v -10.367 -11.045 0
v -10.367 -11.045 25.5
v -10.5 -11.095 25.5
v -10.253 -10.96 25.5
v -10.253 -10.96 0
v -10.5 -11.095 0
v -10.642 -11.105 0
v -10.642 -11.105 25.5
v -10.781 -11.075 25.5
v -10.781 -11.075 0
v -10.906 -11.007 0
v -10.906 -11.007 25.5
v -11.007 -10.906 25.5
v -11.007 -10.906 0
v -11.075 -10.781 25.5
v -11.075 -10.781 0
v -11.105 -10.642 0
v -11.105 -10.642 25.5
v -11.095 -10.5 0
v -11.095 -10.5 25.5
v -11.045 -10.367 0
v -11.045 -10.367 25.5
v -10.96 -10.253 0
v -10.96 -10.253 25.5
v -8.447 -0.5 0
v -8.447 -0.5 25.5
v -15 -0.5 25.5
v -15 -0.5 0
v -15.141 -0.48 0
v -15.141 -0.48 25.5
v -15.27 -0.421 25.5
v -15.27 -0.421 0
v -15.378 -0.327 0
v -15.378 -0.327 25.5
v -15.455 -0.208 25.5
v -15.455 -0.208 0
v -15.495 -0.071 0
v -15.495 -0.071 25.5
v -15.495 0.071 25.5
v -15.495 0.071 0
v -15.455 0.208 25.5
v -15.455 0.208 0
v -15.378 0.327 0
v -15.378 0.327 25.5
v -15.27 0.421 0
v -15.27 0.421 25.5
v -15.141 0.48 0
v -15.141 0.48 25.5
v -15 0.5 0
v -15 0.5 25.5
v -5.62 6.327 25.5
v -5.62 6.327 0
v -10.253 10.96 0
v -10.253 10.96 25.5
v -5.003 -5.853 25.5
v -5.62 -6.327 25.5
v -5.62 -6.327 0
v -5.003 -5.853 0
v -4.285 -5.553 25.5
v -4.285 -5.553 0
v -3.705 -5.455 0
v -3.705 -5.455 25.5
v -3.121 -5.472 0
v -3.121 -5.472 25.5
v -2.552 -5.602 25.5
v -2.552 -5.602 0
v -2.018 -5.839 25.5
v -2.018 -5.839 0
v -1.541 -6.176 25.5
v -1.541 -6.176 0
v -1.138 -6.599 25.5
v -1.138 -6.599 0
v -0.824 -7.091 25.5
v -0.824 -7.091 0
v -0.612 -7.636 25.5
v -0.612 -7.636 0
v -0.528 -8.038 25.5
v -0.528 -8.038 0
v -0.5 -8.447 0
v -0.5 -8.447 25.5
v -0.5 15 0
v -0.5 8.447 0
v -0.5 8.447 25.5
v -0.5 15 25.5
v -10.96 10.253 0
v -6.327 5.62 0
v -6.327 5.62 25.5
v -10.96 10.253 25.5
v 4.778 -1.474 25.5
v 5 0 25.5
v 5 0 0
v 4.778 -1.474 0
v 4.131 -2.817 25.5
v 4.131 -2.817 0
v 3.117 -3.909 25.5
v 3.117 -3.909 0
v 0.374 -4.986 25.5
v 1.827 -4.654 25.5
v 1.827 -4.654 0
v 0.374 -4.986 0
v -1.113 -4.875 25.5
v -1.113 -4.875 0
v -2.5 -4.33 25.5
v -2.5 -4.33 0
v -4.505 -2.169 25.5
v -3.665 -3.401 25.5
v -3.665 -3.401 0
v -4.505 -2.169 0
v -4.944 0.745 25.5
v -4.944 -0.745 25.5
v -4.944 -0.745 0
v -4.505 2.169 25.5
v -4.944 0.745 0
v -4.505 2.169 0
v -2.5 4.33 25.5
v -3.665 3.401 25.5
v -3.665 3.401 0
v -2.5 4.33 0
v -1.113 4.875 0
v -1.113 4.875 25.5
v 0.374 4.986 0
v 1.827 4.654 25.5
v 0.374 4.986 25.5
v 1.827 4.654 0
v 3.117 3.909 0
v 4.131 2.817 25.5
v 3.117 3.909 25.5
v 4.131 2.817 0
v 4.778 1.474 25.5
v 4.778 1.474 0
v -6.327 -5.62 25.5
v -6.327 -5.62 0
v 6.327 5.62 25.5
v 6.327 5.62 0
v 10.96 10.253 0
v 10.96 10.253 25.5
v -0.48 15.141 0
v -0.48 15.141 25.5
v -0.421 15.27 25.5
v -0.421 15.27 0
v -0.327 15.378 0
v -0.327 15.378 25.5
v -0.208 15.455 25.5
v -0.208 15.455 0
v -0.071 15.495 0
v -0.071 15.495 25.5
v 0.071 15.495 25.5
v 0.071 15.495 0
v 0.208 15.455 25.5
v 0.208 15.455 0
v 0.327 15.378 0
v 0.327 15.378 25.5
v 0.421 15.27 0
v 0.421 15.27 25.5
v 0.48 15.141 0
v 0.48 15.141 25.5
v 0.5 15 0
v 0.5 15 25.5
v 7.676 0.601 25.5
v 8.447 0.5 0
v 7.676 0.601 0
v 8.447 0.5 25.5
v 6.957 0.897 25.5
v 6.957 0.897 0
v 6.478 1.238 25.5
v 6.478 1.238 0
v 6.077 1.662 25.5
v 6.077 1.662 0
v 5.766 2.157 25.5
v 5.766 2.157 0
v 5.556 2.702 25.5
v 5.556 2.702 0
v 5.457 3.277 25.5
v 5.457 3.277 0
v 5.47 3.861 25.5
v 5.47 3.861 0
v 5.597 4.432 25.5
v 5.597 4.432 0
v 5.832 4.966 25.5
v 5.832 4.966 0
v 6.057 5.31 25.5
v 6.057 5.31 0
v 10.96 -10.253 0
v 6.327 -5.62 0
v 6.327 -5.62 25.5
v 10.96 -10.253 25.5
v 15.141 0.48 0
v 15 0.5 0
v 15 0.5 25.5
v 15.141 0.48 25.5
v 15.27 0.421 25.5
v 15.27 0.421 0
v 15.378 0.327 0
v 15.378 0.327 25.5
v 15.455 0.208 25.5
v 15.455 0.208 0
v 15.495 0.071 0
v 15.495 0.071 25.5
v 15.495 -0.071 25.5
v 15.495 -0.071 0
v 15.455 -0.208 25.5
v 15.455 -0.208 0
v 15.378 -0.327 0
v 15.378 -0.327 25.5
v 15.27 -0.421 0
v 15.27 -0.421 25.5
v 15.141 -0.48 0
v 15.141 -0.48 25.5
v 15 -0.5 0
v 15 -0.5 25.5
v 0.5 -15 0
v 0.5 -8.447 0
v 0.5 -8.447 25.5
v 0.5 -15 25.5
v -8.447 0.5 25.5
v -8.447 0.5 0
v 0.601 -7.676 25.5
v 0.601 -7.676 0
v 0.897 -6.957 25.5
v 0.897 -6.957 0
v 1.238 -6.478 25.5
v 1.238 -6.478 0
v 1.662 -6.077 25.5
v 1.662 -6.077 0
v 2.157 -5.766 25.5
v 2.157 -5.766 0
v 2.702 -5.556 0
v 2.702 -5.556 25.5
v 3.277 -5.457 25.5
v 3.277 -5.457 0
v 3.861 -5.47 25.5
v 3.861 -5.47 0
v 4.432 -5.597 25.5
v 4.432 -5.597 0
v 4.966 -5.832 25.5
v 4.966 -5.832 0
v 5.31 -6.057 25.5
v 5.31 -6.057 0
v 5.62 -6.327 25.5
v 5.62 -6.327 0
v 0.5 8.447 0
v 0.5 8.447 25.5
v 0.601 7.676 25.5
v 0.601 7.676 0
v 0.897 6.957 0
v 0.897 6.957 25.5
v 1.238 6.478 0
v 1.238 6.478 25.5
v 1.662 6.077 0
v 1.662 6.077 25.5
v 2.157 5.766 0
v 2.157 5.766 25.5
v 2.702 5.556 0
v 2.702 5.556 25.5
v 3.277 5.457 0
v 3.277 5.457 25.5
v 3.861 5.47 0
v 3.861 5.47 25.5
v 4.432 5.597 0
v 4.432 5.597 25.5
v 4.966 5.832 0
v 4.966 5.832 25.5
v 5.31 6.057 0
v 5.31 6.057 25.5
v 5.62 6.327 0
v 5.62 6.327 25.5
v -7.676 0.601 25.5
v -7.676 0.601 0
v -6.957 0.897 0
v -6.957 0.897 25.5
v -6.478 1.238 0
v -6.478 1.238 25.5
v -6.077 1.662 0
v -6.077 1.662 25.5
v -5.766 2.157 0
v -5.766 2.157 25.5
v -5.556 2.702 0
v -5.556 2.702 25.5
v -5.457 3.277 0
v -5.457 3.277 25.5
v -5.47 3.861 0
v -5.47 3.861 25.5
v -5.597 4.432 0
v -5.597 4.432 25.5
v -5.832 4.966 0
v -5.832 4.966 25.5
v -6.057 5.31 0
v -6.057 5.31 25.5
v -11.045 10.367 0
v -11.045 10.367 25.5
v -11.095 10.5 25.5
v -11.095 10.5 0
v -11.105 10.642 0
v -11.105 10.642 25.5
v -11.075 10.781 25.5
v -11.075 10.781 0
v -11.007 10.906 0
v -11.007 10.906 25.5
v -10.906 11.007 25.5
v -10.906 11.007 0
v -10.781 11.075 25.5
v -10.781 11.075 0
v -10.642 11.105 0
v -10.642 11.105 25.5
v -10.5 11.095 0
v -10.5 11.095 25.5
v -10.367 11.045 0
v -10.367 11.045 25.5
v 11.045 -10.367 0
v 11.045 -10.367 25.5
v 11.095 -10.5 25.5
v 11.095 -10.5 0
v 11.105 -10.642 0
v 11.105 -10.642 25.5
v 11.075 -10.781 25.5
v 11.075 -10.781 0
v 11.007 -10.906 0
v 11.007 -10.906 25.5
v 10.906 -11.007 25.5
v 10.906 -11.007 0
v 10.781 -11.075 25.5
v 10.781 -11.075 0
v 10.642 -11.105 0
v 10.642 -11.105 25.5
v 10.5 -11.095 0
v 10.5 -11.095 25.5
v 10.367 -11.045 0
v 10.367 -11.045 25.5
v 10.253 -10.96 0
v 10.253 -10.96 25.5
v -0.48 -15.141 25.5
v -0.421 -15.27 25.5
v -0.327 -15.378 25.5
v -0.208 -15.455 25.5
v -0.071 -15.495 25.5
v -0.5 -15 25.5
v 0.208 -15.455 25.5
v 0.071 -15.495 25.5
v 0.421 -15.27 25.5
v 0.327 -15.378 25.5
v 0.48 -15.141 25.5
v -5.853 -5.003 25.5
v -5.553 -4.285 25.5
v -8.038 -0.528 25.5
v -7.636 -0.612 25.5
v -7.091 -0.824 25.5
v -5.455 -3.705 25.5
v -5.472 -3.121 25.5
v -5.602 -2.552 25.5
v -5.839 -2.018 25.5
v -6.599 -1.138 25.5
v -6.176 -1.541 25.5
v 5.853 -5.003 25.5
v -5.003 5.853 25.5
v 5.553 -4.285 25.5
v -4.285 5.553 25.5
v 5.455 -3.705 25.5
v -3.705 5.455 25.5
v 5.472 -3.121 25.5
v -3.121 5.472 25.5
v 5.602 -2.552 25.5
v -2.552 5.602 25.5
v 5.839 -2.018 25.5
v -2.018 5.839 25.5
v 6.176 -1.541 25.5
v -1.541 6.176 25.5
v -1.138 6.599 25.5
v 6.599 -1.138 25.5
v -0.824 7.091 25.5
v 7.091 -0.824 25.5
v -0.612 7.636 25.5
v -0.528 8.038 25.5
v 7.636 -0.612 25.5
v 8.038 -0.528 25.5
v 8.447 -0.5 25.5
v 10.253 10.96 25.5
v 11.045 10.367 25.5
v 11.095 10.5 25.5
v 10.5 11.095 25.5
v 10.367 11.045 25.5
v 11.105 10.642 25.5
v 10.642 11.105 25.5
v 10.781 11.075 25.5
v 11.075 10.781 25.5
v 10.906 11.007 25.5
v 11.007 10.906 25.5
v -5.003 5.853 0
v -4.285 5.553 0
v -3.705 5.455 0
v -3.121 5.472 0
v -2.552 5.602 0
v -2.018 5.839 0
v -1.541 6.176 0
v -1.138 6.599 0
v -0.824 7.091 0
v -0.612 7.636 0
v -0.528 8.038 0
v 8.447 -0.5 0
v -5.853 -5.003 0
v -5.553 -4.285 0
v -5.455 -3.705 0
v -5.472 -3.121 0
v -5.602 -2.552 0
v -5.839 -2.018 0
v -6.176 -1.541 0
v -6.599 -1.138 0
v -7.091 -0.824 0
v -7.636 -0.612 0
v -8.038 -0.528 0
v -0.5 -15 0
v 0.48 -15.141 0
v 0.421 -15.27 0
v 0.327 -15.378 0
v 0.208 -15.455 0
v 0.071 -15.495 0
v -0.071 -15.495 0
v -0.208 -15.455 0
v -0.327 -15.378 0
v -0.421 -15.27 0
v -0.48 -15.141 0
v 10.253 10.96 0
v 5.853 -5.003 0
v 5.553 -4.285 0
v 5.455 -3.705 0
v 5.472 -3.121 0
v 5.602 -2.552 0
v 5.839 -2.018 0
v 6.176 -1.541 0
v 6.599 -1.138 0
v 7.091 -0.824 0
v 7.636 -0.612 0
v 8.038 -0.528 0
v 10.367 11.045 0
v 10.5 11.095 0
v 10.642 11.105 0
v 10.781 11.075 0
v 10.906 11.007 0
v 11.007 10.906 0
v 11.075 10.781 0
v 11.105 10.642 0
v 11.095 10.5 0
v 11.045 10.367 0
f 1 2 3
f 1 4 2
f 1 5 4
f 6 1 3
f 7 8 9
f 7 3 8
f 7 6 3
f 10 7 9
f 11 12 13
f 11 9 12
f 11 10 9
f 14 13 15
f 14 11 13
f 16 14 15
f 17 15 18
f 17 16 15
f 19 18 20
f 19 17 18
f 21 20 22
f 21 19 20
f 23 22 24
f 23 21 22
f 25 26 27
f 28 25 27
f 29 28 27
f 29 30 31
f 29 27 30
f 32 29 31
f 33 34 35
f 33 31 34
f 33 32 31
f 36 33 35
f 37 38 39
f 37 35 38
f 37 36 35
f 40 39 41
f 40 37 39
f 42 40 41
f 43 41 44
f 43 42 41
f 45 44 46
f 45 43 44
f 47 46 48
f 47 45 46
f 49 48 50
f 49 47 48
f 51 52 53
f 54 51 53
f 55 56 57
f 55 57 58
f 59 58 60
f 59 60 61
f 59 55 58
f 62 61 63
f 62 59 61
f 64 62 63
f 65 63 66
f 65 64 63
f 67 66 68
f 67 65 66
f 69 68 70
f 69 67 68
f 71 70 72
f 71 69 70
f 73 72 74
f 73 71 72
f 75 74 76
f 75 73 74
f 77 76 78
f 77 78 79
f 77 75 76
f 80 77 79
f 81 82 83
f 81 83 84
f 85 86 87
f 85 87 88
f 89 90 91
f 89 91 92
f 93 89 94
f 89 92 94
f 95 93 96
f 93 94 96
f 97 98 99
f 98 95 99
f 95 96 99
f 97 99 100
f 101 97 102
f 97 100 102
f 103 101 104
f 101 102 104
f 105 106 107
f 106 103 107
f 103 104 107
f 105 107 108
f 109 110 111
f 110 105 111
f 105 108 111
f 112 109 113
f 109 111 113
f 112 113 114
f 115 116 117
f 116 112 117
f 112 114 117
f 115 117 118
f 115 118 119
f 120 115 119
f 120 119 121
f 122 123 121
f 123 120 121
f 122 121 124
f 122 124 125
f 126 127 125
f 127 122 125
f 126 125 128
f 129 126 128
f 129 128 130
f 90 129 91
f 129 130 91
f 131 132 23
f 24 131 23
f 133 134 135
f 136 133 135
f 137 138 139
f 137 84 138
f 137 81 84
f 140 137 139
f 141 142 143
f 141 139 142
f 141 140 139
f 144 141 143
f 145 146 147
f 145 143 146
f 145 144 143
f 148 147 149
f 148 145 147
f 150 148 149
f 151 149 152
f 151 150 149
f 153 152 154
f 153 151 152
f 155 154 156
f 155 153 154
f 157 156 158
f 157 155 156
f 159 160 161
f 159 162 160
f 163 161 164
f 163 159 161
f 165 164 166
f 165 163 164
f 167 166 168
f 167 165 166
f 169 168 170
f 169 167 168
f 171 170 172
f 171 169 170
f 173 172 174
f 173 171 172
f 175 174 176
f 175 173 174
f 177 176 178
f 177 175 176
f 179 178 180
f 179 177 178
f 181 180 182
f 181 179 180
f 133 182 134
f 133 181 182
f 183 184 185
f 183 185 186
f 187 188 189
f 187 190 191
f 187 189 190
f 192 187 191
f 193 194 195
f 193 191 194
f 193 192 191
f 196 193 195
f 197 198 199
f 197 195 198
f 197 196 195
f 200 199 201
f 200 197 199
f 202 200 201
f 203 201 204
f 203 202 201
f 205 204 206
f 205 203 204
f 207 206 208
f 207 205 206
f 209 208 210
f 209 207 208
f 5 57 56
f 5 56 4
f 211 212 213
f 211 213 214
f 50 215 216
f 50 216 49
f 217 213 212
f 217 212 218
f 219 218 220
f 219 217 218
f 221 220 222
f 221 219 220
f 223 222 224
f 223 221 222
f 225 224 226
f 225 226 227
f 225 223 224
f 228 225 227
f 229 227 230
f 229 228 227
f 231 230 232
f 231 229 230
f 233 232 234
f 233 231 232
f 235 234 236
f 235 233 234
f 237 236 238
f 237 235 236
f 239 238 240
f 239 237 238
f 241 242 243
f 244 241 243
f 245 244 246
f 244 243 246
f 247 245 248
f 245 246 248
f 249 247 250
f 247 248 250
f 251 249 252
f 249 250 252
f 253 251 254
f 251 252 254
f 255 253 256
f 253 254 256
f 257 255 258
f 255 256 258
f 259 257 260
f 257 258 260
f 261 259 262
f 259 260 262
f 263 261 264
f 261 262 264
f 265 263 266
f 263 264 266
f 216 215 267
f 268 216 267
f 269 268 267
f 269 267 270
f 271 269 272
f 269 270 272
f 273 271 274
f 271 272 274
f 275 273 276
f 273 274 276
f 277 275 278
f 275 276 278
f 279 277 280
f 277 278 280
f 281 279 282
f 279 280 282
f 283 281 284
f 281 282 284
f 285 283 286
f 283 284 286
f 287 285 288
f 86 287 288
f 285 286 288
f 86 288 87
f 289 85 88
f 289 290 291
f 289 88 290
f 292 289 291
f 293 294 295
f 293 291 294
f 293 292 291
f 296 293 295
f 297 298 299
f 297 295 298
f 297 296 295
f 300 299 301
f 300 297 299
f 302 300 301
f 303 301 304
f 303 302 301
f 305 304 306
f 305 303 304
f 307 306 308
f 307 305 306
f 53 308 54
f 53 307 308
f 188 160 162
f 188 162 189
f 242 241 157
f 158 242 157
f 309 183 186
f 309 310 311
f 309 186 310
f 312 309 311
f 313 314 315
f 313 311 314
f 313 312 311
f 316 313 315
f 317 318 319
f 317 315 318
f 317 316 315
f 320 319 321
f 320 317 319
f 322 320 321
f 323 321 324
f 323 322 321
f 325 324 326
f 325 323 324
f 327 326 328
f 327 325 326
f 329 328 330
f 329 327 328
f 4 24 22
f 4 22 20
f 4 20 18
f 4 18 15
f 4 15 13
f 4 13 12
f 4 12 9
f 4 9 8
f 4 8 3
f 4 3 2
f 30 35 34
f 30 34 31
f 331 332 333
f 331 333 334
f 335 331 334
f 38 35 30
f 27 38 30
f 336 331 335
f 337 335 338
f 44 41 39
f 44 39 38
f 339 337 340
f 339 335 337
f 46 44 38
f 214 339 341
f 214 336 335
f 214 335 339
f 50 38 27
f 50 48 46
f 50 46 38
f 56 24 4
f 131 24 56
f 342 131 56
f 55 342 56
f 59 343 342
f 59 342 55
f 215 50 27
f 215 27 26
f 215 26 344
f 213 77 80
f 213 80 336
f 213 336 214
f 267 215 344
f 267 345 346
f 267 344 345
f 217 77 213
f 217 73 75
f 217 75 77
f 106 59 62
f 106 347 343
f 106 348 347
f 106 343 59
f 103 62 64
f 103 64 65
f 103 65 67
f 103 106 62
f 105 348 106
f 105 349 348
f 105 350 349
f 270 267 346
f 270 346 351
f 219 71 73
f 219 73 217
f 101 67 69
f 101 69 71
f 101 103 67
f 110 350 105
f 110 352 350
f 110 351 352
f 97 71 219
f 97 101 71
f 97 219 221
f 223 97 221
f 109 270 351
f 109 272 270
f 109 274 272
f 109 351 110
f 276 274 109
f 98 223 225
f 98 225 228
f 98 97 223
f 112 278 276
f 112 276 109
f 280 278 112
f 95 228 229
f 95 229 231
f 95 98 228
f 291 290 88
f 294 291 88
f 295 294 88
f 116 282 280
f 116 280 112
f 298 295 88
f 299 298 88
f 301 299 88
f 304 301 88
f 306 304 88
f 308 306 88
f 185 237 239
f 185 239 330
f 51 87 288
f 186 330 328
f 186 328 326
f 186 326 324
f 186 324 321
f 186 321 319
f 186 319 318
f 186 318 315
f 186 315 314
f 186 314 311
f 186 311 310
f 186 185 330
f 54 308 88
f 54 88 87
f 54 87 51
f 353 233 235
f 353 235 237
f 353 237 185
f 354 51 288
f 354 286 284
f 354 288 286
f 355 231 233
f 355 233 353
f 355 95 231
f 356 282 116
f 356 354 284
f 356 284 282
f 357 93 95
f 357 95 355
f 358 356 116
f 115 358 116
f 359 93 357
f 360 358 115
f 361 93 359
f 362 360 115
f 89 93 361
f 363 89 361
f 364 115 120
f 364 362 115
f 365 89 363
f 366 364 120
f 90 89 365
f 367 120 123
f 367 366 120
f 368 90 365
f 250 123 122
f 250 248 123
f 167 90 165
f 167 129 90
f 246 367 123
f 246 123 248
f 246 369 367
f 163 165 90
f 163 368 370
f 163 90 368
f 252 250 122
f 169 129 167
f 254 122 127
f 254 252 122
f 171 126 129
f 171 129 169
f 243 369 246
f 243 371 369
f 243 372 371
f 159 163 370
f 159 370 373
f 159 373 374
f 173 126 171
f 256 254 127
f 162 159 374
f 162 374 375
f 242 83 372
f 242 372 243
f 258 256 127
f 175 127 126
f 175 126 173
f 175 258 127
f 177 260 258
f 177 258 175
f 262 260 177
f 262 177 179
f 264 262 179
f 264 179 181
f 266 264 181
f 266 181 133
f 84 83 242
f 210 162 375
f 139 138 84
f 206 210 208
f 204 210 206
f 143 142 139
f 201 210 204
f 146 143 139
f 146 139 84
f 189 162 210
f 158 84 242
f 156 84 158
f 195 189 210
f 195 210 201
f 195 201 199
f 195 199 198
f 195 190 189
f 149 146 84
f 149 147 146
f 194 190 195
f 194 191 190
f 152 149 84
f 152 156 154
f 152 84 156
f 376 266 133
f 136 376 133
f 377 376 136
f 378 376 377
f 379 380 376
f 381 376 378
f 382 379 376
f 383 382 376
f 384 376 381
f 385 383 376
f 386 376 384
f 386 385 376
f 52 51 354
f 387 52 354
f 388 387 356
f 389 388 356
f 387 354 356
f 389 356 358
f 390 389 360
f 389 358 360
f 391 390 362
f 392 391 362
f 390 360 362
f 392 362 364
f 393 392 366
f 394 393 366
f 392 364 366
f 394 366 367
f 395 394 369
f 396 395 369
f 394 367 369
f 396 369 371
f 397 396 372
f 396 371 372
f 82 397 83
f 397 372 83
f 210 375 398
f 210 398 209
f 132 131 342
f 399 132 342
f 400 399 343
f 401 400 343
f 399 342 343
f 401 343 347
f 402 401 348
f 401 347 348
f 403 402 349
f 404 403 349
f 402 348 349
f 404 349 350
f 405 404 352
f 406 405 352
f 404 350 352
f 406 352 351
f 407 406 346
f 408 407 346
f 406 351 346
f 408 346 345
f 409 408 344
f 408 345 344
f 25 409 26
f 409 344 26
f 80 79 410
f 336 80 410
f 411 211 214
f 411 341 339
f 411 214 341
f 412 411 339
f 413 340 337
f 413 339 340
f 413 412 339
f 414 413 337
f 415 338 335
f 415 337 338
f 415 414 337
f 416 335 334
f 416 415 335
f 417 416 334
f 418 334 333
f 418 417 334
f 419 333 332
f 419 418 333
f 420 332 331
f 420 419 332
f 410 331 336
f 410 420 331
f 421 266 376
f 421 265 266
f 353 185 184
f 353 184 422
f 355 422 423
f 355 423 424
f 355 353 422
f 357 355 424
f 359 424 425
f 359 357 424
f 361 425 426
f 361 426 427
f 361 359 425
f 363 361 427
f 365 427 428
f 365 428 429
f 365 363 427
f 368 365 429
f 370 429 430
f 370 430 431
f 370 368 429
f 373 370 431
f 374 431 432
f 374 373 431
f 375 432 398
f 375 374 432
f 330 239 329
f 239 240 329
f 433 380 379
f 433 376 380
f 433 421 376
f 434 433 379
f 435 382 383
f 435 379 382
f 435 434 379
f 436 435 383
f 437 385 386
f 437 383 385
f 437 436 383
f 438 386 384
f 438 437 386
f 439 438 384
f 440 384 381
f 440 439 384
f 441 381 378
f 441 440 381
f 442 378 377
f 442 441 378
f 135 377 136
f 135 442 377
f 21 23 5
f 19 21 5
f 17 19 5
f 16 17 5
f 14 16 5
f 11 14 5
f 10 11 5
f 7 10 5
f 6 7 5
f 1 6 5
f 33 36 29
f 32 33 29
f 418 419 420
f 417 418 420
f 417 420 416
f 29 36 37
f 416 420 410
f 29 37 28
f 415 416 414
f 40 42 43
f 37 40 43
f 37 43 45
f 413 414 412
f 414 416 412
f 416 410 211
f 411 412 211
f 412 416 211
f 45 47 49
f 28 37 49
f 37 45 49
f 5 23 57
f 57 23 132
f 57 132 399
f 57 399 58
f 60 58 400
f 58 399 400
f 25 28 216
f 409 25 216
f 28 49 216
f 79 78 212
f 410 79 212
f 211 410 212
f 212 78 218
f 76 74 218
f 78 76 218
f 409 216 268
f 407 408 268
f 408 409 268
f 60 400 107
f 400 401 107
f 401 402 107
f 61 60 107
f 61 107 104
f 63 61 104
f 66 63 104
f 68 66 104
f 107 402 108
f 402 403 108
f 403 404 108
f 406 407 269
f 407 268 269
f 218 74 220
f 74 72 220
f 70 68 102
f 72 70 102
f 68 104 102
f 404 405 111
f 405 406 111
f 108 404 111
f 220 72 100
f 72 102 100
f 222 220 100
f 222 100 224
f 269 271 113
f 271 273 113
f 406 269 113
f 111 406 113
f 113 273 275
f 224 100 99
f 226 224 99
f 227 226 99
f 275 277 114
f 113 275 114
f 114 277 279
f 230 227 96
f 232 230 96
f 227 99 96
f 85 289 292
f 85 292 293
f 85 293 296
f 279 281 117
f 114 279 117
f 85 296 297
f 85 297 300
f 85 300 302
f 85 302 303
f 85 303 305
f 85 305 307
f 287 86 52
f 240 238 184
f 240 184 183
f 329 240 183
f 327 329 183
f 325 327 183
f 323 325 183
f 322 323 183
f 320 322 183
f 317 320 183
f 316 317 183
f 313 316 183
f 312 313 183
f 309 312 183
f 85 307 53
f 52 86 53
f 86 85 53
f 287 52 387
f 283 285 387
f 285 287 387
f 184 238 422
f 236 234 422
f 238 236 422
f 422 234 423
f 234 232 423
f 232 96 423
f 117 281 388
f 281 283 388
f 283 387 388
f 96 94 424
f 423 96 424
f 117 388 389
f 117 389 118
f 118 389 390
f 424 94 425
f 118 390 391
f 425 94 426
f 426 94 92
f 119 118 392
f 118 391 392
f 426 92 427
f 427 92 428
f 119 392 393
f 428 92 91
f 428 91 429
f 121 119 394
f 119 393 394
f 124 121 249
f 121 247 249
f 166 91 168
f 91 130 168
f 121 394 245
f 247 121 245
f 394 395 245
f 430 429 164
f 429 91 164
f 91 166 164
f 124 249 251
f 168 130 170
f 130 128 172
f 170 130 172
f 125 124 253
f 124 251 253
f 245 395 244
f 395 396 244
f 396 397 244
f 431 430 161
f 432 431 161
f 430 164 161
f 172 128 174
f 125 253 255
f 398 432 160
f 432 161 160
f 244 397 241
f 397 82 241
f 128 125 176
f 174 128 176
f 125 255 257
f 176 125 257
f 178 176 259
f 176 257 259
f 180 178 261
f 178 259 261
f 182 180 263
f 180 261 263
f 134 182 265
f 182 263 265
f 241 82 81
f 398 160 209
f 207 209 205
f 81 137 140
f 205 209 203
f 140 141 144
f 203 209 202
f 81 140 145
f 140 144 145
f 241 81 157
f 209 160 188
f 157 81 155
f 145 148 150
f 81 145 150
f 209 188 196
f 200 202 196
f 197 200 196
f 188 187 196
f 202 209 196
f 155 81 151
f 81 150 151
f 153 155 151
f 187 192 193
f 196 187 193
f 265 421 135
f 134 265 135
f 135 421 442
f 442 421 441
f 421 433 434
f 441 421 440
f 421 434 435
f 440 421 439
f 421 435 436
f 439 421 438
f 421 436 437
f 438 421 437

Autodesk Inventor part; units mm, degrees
ref_plane "YZ Plane" through (0, 0, 0) normal (1, 0, 0) x (0, 1, 0)
ref_plane "XZ Plane" through (0, 0, 0) normal (0, 1, 0) x (-1, 0, 0)
ref_plane "XY Plane" through (0, 0, 0) normal (0, 0, 1) x (1, 0, 0)
sketch "Sketch1" plane through (0, 0, 0) normal (0, 0, 1) x (1, 0, 0)
  circle A0 centre (0, 0) radius 5
  circle A1 centre (0, 0) radius 6
  line L0 (5.9791, 0.5) -> (15, 0.5)
  line L1 (5.9791, -0.5) -> (15, -0.5)
  arc A2 (15, -0.5) -> (15, 0.5) centre (15, 0) ccw
  line L2 (0, 0) -> (15, 0) construction
  line L3 (3.8743, 4.5814) -> (10.253, 10.9602)
  arc A3 (10.9602, 10.253) -> (10.253, 10.9602) centre (10.6066, 10.6066) ccw
  line L4 (4.5814, 3.8743) -> (10.9602, 10.253)
  line L5 (-0.5, 5.9791) -> (-0.5, 15)
  arc A4 (0.5, 15) -> (-0.5, 15) centre (0, 15) ccw
  line L6 (0.5, 5.9791) -> (0.5, 15)
  line L7 (-4.5814, 3.8743) -> (-10.9602, 10.253)
  arc A5 (-10.253, 10.9602) -> (-10.9602, 10.253) centre (-10.6066, 10.6066) ccw
  line L8 (-3.8743, 4.5814) -> (-10.253, 10.9602)
  line L9 (-5.9791, -0.5) -> (-15, -0.5)
  arc A6 (-15, 0.5) -> (-15, -0.5) centre (-15, 0) ccw
  line L10 (-5.9791, 0.5) -> (-15, 0.5)
  circle A7 centre (0, 0) radius 15.5 construction
  line L11 (-3.8743, -4.5814) -> (-10.253, -10.9602)
  arc A8 (-10.9602, -10.253) -> (-10.253, -10.9602) centre (-10.6066, -10.6066) ccw
  line L12 (-4.5814, -3.8743) -> (-10.9602, -10.253)
  line L13 (0.5, -5.9791) -> (0.5, -15)
  arc A9 (-0.5, -15) -> (0.5, -15) centre (0, -15) ccw
  line L14 (-0.5, -5.9791) -> (-0.5, -15)
  line L15 (4.5814, -3.8743) -> (10.9602, -10.253)
  arc A10 (10.253, -10.9602) -> (10.9602, -10.253) centre (10.6066, -10.6066) ccw
  line L16 (3.8743, -4.5814) -> (10.253, -10.9602)
  point P0 (-4.5814, 3.8743)
  point P1 (4.5814, 3.8743)
  point P2 (3.8743, 4.5814)
  point P3 (-3.8743, -4.5814)
  point P4 (-4.5814, -3.8743)
  dimension "d0" = 10
  dimension "d1" = 1
  dimension "d2" = 1
  dimension "d5" = 15
  dimension "d8" = 360
  dimension "d13" = 31
extrude "Extrusion1" add sketch "Sketch1" along normal blind 25.5
fillet "Fillet1" radius 3 16 edges at (5.9791, 0.5, 12.75) (4.5814, 3.8743, 12.75) (-0.5, 5.9791, 12.75) (5.9791, -0.5, 12.75) (-5.9791, 0.5, 12.75) (-5.9791, -0.5, 12.75) (-4.5814, 3.8743, 12.75) (-3.8743, 4.5814, 12.75) (0.5, 5.9791, 12.75) (3.8743, 4.5814, 12.75) (-3.8743, -4.5814, 12.75) (-4.5814, -3.8743, 12.75) (-0.5, -5.9791, 12.75) (0.5, -5.9791, 12.75) (3.8743, -4.5814, 12.75) (4.5814, -3.8743, 12.75)
properties part number "Valvula"
